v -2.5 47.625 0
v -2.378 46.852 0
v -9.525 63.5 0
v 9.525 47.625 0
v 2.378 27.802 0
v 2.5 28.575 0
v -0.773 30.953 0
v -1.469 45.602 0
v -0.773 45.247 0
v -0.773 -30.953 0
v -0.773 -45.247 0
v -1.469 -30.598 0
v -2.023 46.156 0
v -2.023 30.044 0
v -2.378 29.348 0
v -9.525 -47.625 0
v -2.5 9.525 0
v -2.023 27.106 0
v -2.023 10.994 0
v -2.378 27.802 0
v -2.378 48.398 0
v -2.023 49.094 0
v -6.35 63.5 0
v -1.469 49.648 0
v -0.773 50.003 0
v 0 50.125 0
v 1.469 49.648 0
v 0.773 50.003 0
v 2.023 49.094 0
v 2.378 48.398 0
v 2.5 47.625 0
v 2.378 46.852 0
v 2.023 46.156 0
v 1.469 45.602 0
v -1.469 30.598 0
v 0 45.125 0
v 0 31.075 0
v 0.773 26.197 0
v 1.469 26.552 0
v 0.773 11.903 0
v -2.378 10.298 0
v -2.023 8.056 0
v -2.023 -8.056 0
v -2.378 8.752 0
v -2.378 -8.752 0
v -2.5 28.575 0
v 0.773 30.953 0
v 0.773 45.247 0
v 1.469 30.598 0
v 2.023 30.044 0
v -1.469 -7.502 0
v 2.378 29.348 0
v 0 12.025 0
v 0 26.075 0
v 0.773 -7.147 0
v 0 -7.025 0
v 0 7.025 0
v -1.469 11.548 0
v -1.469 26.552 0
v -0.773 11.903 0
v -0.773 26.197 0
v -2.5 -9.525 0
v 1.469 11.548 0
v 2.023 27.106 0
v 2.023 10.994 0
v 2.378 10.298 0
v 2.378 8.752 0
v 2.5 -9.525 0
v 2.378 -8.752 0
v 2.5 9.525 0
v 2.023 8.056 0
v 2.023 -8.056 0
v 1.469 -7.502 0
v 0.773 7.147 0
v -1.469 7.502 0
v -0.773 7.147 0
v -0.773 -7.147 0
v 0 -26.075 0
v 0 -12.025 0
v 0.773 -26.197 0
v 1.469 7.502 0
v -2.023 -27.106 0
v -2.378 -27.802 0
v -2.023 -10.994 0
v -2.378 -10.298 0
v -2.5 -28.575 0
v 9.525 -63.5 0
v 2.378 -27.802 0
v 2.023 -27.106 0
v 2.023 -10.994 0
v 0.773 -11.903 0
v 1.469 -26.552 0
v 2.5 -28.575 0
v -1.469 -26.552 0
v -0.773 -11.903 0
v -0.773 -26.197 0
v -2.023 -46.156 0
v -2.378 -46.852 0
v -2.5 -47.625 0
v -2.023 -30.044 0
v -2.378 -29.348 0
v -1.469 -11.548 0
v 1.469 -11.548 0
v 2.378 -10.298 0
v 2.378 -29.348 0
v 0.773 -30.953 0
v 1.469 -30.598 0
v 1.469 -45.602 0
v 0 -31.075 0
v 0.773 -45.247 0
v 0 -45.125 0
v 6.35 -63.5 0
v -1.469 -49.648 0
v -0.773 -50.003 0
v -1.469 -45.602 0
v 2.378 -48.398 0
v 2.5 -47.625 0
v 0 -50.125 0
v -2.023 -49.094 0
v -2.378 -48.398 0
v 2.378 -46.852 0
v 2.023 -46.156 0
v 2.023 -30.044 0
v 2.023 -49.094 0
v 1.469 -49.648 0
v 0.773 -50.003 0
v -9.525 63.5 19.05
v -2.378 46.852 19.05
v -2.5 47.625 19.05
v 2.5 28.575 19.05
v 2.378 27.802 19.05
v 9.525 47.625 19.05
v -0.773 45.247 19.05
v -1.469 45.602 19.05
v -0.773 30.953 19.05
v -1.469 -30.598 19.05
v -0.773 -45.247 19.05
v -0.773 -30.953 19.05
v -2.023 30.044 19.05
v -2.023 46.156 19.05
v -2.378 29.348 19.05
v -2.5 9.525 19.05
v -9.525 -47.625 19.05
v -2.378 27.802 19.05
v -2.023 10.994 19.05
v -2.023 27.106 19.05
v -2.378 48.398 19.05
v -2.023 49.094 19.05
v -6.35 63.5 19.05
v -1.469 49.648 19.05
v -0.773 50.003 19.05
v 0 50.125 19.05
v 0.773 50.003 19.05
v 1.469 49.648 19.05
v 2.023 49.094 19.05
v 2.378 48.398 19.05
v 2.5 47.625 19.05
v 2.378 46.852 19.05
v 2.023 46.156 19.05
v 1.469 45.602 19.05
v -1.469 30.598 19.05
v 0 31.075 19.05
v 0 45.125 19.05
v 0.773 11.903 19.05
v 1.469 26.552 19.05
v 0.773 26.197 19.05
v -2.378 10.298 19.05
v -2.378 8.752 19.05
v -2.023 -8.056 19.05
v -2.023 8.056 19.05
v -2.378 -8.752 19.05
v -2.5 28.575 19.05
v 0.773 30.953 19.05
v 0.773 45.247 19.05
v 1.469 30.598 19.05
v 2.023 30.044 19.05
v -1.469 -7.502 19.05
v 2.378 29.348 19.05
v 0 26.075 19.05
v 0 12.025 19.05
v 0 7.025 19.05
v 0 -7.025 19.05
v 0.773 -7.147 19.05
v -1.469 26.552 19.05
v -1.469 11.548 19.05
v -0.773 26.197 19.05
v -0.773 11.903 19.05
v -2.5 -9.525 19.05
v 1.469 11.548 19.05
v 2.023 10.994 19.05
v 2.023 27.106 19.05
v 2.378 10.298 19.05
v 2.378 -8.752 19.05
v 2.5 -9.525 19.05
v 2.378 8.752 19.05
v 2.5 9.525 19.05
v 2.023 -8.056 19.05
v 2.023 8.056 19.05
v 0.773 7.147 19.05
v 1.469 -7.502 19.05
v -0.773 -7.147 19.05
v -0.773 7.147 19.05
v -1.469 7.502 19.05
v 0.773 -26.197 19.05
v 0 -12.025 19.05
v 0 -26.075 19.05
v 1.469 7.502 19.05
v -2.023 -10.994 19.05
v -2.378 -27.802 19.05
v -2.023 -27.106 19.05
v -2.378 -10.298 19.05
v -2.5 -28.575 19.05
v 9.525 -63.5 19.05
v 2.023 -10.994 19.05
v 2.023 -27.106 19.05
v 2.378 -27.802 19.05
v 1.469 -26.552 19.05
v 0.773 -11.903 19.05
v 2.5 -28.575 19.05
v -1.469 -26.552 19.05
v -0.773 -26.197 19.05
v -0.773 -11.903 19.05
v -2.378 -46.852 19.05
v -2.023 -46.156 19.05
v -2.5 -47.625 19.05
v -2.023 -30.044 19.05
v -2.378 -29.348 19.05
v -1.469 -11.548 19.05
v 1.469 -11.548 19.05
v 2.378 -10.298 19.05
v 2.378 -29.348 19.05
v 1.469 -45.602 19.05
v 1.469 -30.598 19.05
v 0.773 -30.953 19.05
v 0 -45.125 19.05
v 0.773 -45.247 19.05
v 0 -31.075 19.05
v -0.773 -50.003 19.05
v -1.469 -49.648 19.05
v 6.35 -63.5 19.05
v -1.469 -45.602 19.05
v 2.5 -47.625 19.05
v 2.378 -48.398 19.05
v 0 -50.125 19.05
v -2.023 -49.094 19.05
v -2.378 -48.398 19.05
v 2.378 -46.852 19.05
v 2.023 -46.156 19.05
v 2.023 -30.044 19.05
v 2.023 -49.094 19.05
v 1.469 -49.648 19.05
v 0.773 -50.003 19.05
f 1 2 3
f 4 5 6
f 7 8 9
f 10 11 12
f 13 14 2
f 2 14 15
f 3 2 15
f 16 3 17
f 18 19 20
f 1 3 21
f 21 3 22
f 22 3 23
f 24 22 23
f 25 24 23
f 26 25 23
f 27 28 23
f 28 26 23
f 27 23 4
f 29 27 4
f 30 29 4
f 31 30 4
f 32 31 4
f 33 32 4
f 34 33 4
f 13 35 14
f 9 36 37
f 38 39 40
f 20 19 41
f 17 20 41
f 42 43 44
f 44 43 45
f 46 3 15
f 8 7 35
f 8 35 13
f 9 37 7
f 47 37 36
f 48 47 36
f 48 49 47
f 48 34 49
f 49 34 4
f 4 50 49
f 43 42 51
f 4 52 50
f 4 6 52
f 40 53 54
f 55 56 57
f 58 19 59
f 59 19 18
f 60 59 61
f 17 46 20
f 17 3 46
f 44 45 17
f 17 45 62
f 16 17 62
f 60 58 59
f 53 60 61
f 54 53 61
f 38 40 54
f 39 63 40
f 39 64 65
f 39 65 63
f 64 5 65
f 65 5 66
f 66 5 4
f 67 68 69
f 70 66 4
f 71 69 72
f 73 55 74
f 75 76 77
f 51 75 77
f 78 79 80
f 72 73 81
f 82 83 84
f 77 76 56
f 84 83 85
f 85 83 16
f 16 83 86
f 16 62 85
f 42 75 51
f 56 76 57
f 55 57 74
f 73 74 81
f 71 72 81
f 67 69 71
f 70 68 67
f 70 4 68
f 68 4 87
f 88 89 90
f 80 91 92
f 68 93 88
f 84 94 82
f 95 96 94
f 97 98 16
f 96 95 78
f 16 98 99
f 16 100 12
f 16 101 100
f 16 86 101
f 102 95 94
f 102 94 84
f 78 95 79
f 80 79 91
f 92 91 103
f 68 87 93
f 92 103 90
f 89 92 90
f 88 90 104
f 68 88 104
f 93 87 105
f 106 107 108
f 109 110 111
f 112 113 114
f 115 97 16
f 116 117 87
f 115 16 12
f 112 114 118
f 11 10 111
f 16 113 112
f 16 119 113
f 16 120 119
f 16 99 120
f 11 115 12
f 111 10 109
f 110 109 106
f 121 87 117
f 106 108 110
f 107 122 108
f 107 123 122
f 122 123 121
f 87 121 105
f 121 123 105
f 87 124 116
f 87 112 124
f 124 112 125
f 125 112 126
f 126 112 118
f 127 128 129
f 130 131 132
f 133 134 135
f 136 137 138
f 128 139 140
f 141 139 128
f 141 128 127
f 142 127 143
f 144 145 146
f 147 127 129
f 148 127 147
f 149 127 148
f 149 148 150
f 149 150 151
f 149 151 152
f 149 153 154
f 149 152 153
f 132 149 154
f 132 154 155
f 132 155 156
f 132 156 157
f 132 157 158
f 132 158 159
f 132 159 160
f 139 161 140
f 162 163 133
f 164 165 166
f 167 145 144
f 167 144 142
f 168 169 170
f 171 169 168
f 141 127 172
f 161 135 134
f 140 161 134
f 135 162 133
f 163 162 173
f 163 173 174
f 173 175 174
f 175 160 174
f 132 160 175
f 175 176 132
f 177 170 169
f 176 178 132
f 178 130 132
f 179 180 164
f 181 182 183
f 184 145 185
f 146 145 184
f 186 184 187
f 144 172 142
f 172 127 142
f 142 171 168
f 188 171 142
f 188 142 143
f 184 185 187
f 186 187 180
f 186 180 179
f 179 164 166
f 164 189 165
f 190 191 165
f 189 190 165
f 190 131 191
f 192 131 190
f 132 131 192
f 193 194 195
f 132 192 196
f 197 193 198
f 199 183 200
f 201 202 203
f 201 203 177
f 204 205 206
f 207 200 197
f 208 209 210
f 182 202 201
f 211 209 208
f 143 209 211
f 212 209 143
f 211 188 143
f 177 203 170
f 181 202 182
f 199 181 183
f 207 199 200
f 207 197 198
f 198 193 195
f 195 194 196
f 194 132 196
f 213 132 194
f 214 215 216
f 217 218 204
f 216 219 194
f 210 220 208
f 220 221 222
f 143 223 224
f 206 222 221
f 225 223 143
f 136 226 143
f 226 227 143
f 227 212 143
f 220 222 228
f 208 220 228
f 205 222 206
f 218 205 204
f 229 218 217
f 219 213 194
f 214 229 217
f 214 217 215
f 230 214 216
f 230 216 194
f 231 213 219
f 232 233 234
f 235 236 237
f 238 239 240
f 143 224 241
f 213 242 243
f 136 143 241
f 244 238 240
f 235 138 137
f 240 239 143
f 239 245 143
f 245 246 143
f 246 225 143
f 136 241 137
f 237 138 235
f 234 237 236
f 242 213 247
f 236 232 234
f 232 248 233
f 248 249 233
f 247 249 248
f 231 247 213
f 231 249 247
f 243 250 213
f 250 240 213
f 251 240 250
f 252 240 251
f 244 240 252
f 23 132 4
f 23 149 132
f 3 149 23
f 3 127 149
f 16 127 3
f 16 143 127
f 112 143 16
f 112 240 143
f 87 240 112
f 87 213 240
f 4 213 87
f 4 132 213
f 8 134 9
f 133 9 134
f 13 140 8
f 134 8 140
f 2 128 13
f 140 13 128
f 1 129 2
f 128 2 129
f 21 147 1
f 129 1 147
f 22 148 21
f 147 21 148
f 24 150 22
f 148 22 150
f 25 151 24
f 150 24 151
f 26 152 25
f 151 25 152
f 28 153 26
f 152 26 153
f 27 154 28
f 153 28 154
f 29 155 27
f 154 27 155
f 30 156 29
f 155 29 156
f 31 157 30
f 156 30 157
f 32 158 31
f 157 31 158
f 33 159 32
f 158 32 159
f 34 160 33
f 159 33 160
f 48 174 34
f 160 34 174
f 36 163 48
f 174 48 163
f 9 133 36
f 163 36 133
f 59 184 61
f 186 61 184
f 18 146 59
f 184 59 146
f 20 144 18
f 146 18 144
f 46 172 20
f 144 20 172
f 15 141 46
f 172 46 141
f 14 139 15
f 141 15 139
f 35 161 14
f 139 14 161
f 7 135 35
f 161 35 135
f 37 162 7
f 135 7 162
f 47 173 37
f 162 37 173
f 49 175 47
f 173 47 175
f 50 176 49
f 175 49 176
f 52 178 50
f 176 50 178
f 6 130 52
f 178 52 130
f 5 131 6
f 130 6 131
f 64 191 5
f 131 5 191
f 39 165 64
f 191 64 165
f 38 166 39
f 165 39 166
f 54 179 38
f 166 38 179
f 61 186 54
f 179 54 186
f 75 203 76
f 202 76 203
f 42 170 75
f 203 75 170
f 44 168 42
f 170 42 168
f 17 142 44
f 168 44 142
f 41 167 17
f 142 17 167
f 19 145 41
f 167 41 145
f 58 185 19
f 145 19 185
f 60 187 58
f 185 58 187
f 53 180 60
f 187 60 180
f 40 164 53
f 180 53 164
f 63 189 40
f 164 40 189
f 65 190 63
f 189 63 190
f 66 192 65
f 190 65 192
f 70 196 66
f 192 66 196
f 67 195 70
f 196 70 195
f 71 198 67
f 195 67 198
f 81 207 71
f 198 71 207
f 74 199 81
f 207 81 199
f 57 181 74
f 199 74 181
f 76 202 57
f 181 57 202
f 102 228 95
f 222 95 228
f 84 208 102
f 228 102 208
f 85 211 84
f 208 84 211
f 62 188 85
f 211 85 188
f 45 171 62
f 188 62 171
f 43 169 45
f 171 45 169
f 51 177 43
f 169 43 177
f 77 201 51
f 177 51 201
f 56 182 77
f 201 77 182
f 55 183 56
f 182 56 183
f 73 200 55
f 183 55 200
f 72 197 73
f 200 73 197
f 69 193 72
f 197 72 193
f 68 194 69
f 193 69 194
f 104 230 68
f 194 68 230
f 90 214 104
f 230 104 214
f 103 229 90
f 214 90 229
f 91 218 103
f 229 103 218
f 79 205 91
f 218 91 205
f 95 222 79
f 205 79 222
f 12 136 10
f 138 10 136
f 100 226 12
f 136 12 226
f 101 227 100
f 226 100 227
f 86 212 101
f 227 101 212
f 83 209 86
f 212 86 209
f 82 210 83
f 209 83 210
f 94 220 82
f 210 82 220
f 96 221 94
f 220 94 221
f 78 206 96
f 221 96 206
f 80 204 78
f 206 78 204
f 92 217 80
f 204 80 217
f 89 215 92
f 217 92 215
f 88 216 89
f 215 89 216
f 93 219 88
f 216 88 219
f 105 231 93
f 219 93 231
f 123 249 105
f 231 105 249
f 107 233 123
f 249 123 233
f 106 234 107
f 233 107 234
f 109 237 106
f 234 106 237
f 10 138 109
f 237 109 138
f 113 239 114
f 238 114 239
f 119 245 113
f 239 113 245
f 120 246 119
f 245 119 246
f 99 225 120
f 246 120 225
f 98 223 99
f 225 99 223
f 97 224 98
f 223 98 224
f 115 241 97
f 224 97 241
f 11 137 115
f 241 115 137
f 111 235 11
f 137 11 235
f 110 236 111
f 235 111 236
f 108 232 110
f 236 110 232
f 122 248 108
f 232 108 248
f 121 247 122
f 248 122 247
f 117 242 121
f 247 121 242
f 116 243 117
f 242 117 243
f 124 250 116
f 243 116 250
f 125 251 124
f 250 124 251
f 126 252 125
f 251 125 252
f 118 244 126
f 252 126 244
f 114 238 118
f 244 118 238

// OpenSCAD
// French cleat cross-sections, v1.1
// 
// v1.1:
// - hole_diameter = 0 skips holes entirely

thickness_inches = 0.75;
nominal_height_inches = 4.5;
length_inches = 0.75;
top_edge_slant = 1; // [-1, 0, 1]
top_edge_trim_inches = 0.125;
bottom_edge_slant = 1; // [-1, 0, 1]
bottom_edge_trim_inches = 0.125;
hole_spacing_inches = 0.75;
// Diameter of holes, in mm
hole_diameter = 5;

// Detail level; only affects holes
$fn = 20;

module __no_more_parameters() { }

inch = 25.4;

thickness = thickness_inches * inch;
height = nominal_height_inches * inch;
length = length_inches * inch;
top_edge_trim    =    top_edge_trim_inches * inch;
bottom_edge_trim = bottom_edge_trim_inches * inch;
hole_spacing     = hole_spacing_inches * inch;

function edge_points(height, thickness, slant) =
	[
		[-thickness/2, height/2 + slant*thickness/2],
		[ thickness/2, height/2 - slant*thickness/2],
	];

function scale_points_2d(points, by) = [
	for( p=points ) [p[0]*by[0], p[1]*by[1]]
];

function fc_corner_points_2d(height, thickness, top_slant, bottom_slant) = [
	each edge_points(height, thickness, top_slant),
	each scale_points_2d(edge_points(height, thickness, bottom_slant), [-1,-1]),
];

linear_extrude(length) {
	difference() {
		intersection() {
			polygon(fc_corner_points_2d(height, thickness, top_edge_slant, bottom_edge_slant));
			trim_top_y    =  height/2 + abs(top_edge_slant * thickness/2) - top_edge_trim;
			trim_bottom_y = -height/2 - abs(bottom_edge_slant * thickness/2) + bottom_edge_trim;
			polygon([
				[-thickness, trim_top_y   ],
				[+thickness, trim_top_y   ],
				[+thickness, trim_bottom_y],
				[-thickness, trim_bottom_y],
			]);
		}
		if( hole_diameter > 0 ) for( y=[-round(height/2/hole_spacing)+0.5 : 1 : round(height/2/hole_spacing)-0.5] ) {
			translate([0, y*hole_spacing, 0]) circle(d=hole_diameter);
		}
	}
}
